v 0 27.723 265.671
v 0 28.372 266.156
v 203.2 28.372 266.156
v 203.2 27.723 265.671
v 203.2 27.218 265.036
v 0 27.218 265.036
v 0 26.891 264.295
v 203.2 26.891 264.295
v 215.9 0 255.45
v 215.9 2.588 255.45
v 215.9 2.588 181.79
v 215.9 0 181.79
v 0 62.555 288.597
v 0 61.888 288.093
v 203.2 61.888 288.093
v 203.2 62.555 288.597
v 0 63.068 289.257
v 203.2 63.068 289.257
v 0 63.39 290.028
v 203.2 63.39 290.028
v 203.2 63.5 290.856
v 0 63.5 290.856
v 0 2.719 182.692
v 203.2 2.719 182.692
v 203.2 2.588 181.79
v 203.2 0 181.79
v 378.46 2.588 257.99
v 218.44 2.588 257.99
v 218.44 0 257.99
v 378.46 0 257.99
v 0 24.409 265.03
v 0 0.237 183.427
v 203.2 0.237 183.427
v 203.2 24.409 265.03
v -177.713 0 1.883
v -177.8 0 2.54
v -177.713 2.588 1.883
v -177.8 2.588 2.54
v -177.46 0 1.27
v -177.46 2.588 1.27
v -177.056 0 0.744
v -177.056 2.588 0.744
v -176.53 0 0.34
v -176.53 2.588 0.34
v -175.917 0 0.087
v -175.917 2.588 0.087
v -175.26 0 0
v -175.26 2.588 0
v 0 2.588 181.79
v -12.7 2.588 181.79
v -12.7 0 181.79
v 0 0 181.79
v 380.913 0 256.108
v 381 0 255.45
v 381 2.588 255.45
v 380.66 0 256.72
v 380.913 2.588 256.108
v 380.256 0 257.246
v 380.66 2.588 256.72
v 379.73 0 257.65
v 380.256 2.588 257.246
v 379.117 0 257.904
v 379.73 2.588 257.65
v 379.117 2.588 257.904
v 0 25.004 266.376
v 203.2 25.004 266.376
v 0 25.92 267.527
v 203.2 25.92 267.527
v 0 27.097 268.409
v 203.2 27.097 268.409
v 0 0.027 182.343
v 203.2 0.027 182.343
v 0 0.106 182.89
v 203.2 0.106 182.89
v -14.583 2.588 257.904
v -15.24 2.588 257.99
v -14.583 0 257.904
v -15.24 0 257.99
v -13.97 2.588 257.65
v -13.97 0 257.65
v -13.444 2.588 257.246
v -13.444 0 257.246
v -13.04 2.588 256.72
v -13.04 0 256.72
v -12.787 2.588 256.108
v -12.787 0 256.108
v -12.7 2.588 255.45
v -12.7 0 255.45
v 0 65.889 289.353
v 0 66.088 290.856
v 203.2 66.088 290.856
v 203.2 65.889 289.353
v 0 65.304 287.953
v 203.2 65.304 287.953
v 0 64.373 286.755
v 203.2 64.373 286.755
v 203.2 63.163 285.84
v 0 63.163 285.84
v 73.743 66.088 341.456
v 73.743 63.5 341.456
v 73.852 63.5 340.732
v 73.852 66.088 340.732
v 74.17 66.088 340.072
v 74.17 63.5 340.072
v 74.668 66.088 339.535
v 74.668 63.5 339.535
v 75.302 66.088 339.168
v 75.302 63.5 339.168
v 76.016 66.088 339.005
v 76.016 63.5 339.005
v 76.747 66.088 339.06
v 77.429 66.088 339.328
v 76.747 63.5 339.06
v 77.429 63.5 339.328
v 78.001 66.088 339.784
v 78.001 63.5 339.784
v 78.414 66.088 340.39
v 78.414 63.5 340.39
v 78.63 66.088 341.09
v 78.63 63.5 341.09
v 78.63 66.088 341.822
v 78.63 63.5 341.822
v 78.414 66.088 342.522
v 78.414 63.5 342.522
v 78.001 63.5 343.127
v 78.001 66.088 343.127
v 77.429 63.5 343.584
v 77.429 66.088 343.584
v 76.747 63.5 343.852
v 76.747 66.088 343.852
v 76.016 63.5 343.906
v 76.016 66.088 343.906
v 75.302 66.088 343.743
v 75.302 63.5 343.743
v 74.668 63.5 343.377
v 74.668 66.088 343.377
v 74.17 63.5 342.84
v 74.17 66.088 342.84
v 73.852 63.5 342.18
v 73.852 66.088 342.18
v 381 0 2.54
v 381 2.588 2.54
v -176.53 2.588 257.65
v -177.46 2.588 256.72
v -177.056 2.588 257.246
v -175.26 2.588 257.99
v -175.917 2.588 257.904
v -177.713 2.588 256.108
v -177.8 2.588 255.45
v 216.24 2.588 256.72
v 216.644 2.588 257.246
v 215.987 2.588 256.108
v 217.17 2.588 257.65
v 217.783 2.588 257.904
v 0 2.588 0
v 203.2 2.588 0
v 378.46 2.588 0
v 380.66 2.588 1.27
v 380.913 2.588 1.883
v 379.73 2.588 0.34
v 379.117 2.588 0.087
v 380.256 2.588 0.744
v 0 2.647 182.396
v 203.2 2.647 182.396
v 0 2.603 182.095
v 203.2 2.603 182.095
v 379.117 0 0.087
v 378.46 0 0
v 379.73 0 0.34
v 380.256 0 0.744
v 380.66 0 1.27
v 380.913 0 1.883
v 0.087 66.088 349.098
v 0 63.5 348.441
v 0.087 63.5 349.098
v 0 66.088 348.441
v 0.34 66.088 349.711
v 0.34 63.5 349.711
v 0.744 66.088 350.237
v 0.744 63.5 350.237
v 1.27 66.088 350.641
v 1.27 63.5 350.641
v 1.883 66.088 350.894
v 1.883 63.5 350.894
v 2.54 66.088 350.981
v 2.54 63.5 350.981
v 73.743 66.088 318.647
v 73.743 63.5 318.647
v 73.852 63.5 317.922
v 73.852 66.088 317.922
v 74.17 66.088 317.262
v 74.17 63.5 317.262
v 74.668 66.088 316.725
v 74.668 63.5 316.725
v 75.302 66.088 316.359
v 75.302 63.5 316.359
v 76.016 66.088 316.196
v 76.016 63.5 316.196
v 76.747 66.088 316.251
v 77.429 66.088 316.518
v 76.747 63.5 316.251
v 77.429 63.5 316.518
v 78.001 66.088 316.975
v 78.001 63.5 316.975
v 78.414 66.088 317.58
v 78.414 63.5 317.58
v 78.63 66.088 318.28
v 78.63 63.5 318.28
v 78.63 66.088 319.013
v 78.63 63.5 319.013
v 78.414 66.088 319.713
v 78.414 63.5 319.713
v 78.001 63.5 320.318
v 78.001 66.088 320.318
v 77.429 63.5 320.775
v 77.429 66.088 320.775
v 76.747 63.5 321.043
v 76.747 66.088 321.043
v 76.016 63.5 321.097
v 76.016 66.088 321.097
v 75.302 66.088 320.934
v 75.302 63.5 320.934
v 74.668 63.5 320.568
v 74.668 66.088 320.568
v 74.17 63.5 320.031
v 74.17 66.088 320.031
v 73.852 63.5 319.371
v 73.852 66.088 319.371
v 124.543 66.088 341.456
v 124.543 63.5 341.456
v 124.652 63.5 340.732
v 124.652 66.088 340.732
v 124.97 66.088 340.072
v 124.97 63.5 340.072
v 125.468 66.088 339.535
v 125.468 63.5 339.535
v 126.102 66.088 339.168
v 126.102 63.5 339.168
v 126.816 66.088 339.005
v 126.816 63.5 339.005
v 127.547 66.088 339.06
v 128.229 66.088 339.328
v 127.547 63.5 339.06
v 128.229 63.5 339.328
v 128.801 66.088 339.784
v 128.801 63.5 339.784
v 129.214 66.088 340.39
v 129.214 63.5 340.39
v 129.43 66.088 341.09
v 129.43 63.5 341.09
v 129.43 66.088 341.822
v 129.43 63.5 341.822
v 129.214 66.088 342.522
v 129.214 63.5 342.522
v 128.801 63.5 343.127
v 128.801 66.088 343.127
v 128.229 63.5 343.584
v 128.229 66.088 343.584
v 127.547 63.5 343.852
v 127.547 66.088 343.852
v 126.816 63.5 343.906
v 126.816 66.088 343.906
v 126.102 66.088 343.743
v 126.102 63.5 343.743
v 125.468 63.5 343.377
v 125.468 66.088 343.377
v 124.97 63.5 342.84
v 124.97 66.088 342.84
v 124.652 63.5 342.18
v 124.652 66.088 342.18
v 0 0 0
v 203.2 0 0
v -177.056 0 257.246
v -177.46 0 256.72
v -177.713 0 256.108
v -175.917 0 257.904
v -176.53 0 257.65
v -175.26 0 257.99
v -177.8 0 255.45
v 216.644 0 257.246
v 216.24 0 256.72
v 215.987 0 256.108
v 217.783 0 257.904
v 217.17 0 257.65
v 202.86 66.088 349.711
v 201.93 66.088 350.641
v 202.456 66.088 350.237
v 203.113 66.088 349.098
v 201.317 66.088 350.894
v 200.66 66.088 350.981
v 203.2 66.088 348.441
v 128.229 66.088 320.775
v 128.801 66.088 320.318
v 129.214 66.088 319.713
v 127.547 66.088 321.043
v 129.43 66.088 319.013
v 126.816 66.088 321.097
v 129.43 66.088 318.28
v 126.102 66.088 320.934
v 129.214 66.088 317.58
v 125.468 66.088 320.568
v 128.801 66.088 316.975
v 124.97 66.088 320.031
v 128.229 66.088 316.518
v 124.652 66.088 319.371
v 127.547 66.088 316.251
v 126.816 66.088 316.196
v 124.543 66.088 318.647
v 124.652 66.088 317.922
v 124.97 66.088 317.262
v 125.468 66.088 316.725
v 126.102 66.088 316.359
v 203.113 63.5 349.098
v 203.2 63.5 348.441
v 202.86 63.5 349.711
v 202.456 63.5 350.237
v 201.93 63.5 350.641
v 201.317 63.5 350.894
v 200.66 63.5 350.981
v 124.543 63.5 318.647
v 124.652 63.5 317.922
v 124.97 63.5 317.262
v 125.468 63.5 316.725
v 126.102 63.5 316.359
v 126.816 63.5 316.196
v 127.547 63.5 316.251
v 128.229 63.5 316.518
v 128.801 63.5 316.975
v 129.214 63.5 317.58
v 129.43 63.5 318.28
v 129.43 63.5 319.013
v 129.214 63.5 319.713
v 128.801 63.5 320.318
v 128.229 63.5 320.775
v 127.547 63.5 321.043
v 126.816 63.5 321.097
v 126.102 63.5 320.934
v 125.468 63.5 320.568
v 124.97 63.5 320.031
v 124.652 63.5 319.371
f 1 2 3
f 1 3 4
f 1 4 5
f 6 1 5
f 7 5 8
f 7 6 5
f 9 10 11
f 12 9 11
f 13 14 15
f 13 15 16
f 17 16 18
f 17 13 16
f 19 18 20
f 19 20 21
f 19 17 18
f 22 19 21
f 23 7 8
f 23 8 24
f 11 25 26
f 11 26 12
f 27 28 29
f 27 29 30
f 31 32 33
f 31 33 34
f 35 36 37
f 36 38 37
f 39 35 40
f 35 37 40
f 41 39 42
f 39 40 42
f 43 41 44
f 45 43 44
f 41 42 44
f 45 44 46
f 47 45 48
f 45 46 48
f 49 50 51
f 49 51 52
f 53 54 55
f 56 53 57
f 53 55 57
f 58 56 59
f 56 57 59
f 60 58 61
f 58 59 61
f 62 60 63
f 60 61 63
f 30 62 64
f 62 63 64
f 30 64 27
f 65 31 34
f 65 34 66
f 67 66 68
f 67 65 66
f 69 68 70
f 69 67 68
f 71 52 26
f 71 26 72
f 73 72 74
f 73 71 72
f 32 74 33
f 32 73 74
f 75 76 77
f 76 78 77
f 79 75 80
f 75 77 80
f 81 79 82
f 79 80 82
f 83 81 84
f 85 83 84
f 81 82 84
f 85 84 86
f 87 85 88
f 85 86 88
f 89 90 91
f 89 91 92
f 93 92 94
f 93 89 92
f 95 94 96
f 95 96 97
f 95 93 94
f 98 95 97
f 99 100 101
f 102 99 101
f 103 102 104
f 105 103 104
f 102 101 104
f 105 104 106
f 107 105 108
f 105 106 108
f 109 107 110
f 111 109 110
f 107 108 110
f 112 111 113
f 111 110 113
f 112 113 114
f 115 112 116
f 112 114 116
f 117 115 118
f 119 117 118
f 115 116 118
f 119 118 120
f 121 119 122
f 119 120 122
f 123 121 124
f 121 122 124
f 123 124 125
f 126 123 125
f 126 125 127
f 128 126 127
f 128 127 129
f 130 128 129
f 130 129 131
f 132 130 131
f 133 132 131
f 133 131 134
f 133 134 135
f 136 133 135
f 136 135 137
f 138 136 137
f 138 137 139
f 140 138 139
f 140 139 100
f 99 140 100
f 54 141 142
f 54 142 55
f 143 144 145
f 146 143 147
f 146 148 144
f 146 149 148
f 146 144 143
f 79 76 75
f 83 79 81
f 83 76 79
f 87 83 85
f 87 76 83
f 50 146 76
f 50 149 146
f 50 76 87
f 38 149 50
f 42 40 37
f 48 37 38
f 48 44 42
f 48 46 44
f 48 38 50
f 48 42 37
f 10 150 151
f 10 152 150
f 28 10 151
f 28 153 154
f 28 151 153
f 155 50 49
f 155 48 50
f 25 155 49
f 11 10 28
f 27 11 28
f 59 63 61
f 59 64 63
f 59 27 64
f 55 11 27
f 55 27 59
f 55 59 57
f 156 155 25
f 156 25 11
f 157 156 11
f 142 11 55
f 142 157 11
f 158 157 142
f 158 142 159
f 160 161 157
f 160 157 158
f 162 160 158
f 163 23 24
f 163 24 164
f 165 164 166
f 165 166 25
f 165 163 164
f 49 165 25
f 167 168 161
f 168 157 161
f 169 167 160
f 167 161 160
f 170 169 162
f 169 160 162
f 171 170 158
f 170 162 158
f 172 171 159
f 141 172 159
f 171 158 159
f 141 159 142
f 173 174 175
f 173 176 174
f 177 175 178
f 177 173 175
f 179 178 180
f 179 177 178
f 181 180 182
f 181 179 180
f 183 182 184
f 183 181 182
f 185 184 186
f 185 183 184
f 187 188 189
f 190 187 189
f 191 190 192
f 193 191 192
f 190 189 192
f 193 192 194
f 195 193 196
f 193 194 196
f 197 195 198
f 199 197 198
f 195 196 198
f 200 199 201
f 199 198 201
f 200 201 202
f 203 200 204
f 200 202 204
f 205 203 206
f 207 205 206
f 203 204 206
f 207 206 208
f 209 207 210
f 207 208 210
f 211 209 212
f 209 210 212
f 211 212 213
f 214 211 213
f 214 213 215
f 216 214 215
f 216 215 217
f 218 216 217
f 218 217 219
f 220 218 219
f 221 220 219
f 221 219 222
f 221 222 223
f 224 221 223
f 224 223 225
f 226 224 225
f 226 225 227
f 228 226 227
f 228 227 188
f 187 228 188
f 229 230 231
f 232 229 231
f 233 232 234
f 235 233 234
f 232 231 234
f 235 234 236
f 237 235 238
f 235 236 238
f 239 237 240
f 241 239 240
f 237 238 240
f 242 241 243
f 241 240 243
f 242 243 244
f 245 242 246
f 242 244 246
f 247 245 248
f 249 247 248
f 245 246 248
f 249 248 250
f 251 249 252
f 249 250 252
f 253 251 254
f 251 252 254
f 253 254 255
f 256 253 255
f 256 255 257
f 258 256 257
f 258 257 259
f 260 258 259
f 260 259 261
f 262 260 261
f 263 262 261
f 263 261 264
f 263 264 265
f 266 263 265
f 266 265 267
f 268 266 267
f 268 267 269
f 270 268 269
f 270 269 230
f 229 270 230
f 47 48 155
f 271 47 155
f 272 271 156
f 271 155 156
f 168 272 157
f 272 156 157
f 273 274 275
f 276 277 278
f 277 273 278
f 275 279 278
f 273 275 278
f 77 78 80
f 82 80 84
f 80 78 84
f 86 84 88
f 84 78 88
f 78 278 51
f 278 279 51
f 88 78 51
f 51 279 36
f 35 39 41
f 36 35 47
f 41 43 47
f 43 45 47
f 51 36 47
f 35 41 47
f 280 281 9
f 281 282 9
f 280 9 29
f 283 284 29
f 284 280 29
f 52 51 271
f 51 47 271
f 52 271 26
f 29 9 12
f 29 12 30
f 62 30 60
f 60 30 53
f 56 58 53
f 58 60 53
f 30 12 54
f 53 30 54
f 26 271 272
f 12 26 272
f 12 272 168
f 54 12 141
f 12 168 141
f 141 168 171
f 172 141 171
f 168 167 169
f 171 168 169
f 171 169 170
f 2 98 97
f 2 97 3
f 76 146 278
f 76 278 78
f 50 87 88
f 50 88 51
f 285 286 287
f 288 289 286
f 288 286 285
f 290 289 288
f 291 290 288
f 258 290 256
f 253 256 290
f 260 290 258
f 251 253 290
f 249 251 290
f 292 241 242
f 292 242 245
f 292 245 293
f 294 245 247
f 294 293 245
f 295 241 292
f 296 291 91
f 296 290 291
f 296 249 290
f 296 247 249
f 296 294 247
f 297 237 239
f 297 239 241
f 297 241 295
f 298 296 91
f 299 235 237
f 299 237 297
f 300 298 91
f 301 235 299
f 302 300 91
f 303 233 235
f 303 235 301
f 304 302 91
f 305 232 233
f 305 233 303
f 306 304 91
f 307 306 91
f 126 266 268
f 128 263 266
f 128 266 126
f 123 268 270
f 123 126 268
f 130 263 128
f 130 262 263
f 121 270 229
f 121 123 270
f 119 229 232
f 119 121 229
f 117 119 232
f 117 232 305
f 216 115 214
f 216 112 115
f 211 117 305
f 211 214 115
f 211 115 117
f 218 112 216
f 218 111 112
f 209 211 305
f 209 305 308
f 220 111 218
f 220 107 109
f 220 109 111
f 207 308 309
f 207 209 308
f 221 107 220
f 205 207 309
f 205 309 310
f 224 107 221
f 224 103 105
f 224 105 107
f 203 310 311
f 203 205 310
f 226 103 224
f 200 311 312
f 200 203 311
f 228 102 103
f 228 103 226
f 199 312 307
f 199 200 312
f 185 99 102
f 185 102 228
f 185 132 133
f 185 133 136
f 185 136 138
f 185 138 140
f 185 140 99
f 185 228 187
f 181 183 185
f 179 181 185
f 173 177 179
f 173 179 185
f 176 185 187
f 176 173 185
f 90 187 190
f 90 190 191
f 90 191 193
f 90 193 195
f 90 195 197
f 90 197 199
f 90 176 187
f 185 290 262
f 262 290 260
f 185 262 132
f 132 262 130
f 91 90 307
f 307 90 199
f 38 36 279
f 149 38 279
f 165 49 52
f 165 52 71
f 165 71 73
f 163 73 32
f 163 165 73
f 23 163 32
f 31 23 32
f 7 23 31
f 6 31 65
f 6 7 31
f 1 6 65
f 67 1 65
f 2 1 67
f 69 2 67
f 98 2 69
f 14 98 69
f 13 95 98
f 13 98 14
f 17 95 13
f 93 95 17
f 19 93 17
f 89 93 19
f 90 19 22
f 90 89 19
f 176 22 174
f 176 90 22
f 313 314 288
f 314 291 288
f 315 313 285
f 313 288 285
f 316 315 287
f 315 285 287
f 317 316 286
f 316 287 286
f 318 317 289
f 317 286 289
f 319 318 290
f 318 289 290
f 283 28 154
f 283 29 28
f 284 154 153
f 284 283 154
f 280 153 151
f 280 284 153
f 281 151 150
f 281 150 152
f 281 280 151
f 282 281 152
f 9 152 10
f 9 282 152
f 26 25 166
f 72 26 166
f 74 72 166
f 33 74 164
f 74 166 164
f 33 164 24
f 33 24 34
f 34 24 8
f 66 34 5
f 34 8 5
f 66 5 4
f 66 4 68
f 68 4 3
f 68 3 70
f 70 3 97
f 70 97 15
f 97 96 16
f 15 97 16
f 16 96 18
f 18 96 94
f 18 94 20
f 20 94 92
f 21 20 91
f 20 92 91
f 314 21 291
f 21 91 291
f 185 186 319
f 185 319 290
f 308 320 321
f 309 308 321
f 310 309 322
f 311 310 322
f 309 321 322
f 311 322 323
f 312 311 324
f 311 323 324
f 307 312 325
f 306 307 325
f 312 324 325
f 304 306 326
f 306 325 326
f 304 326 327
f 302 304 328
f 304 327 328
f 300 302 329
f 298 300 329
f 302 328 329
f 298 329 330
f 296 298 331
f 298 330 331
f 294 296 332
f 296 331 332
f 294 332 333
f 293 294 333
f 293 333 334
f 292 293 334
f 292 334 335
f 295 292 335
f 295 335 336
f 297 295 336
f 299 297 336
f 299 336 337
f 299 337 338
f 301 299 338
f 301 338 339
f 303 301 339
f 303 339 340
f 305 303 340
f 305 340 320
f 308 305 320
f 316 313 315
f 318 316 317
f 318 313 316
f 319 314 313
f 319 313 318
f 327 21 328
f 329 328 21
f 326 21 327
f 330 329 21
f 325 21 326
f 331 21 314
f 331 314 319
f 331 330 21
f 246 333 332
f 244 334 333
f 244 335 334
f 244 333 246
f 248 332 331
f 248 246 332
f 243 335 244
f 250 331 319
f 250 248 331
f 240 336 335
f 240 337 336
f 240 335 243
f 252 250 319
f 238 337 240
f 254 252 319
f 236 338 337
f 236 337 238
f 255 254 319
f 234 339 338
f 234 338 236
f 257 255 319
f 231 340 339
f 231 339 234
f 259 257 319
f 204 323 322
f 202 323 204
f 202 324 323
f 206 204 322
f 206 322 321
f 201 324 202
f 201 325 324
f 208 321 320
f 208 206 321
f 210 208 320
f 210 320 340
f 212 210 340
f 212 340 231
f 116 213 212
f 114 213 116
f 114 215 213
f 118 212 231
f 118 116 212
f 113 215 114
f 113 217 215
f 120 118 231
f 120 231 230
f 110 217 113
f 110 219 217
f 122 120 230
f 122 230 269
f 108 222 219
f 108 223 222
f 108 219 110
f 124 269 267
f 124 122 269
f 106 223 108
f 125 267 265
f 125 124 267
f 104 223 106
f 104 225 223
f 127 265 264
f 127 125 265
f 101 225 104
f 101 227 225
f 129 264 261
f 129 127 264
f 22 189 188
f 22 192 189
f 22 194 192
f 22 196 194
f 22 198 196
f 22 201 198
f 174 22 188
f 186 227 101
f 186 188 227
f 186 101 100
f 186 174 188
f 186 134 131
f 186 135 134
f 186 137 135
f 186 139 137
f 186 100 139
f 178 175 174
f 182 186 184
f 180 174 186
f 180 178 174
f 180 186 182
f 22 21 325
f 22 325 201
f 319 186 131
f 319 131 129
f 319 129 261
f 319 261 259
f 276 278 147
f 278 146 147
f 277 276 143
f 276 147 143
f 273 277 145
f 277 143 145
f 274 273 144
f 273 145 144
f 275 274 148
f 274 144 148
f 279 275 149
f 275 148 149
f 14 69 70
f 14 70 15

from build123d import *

# Parameters (mm, degrees)
BASE_FLANGE1_DEPTH           = 203.2
SKETCH2_W                    = 196.85
SKETCH2_H                    = 181.790367069
BOSS_EXTRUDE1_DEPTH          = 2.58826
F_10_0_1935_DIAMETER_HOLE1_D = 4.9149
SKETCH16_W                   = 184.15
SKETCH16_H                   = 76.2
BOSS_EXTRUDE2_DEPTH          = 2.58826
SKETCH17_W                   = 19.05
SKETCH17_H                   = 257.990367069
CUT_EXTRUDE1_DEPTH           = 537.279077243
FILLET1_R                    = 2.54


# Sheet-metal steps are written as plain solids
with BuildPart() as part:
    # Sketch1 → Base-Flange1 (new body)
    with BuildSketch(Plane(origin=(0, 0, 0), x_dir=(0, 0, -1), z_dir=(1, 0, 0))):
        with BuildLine():
            Line((0, 0), (-181.790367069, 0))
            ThreePointArc((-181.790367069, 0), (-182.617352358, 0.059641748), (-183.427221345, 0.237332575))
            Line((-183.427221345, 0.237332575), (-265.029897441, 24.40914646))
            ThreePointArc((-265.029897441, 24.40914646), (-266.980756871, 25.424699599), (-268.409129334, 27.097108878))
            Line((-268.409129334, 27.097108878), (-288.093120118, 61.888444803))
            ThreePointArc((-288.093120118, 61.888444803), (-289.257017075, 63.067677729), (-290.856499452, 63.5))
            Line((-290.856499452, 63.5), (-350.980894178, 63.5))
            Line((-350.980894178, 63.5), (-350.980894178, 66.08826))
            Line((-350.980894178, 66.08826), (-290.856499452, 66.08826))
            ThreePointArc((-290.856499452, 66.08826), (-287.953119041, 65.303508614), (-285.840413284, 63.162965007))
            Line((-285.840413284, 63.162965007), (-266.156422501, 28.371629081))
            ThreePointArc((-266.156422501, 28.371629081), (-265.369527137, 27.450292987), (-264.294791885, 26.890821227))
            Line((-264.294791885, 26.890821227), (-182.692115789, 2.719007342))
            ThreePointArc((-182.692115789, 2.719007342), (-182.245956144, 2.621116847), (-181.790367069, 2.58826))
            Line((-181.790367069, 2.58826), (0, 2.58826))
            Line((0, 2.58826), (0, 0))
        make_face()
    extrude(amount=BASE_FLANGE1_DEPTH)

    # Sketch2 → Boss-Extrude1 (add)
    with BuildSketch(Plane(origin=(0, 2.58826, 0), x_dir=(1, 0, 0), z_dir=(0, 1, 0))):
        with Locations((-98.425, -90.895183535)):
            Rectangle(SKETCH2_W, SKETCH2_H)
        with Locations((301.625, -90.895183535)):
            Rectangle(SKETCH2_W, SKETCH2_H)
    extrude(amount=-BOSS_EXTRUDE1_DEPTH)

    # #10 (0.1935) Diameter Hole1 (through all)
    with Locations(Plane(origin=(0, 66.08826, 0), x_dir=(1, 0, 0), z_dir=(0, 1, 0))):
        with Locations((76.2, -341.455894178), (76.2, -318.646694178), (127, -318.646694178), (127, -341.455894178)):
            Hole(F_10_0_1935_DIAMETER_HOLE1_D / 2)

    # Sketch16 → Boss-Extrude2 (add)
    with BuildSketch(Plane(origin=(0, 2.58826, 0), x_dir=(1, 0, 0), z_dir=(0, 1, 0))):
        with Locations((-104.775, -219.890367069)):
            Rectangle(SKETCH16_W, SKETCH16_H)
        with Locations((307.975, -219.890367069)):
            Rectangle(SKETCH16_W, SKETCH16_H)
    extrude(amount=-BOSS_EXTRUDE2_DEPTH)

    # Sketch17 → Cut-Extrude1 (cut, through all)
    with BuildSketch(Plane.XZ):
        with Locations((-187.325, 128.995183535)):
            Rectangle(SKETCH17_W, SKETCH17_H)
        with Locations((390.525, 128.995183535)):
            Rectangle(SKETCH17_W, SKETCH17_H)
    extrude(amount=-CUT_EXTRUDE1_DEPTH, mode=Mode.SUBTRACT)

    # Fillet1
    fillet1_edges = [part.edges().sort_by_distance(p)[0] for p in [
        (-12.7, 1.29413, 257.990367069),
        (215.9, 1.29413, 257.990367069),
        (381, 1.29413, 257.990367069),
        (-177.8, 1.29413, 257.990367069),
        (-177.8, 1.29413, 0),
        (381, 1.29413, 0),
        (0, 64.79413, 350.980894178),
        (203.2, 64.79413, 350.980894178),
    ]]
    fillet(fillet1_edges, radius=FILLET1_R)


solid = part.part
